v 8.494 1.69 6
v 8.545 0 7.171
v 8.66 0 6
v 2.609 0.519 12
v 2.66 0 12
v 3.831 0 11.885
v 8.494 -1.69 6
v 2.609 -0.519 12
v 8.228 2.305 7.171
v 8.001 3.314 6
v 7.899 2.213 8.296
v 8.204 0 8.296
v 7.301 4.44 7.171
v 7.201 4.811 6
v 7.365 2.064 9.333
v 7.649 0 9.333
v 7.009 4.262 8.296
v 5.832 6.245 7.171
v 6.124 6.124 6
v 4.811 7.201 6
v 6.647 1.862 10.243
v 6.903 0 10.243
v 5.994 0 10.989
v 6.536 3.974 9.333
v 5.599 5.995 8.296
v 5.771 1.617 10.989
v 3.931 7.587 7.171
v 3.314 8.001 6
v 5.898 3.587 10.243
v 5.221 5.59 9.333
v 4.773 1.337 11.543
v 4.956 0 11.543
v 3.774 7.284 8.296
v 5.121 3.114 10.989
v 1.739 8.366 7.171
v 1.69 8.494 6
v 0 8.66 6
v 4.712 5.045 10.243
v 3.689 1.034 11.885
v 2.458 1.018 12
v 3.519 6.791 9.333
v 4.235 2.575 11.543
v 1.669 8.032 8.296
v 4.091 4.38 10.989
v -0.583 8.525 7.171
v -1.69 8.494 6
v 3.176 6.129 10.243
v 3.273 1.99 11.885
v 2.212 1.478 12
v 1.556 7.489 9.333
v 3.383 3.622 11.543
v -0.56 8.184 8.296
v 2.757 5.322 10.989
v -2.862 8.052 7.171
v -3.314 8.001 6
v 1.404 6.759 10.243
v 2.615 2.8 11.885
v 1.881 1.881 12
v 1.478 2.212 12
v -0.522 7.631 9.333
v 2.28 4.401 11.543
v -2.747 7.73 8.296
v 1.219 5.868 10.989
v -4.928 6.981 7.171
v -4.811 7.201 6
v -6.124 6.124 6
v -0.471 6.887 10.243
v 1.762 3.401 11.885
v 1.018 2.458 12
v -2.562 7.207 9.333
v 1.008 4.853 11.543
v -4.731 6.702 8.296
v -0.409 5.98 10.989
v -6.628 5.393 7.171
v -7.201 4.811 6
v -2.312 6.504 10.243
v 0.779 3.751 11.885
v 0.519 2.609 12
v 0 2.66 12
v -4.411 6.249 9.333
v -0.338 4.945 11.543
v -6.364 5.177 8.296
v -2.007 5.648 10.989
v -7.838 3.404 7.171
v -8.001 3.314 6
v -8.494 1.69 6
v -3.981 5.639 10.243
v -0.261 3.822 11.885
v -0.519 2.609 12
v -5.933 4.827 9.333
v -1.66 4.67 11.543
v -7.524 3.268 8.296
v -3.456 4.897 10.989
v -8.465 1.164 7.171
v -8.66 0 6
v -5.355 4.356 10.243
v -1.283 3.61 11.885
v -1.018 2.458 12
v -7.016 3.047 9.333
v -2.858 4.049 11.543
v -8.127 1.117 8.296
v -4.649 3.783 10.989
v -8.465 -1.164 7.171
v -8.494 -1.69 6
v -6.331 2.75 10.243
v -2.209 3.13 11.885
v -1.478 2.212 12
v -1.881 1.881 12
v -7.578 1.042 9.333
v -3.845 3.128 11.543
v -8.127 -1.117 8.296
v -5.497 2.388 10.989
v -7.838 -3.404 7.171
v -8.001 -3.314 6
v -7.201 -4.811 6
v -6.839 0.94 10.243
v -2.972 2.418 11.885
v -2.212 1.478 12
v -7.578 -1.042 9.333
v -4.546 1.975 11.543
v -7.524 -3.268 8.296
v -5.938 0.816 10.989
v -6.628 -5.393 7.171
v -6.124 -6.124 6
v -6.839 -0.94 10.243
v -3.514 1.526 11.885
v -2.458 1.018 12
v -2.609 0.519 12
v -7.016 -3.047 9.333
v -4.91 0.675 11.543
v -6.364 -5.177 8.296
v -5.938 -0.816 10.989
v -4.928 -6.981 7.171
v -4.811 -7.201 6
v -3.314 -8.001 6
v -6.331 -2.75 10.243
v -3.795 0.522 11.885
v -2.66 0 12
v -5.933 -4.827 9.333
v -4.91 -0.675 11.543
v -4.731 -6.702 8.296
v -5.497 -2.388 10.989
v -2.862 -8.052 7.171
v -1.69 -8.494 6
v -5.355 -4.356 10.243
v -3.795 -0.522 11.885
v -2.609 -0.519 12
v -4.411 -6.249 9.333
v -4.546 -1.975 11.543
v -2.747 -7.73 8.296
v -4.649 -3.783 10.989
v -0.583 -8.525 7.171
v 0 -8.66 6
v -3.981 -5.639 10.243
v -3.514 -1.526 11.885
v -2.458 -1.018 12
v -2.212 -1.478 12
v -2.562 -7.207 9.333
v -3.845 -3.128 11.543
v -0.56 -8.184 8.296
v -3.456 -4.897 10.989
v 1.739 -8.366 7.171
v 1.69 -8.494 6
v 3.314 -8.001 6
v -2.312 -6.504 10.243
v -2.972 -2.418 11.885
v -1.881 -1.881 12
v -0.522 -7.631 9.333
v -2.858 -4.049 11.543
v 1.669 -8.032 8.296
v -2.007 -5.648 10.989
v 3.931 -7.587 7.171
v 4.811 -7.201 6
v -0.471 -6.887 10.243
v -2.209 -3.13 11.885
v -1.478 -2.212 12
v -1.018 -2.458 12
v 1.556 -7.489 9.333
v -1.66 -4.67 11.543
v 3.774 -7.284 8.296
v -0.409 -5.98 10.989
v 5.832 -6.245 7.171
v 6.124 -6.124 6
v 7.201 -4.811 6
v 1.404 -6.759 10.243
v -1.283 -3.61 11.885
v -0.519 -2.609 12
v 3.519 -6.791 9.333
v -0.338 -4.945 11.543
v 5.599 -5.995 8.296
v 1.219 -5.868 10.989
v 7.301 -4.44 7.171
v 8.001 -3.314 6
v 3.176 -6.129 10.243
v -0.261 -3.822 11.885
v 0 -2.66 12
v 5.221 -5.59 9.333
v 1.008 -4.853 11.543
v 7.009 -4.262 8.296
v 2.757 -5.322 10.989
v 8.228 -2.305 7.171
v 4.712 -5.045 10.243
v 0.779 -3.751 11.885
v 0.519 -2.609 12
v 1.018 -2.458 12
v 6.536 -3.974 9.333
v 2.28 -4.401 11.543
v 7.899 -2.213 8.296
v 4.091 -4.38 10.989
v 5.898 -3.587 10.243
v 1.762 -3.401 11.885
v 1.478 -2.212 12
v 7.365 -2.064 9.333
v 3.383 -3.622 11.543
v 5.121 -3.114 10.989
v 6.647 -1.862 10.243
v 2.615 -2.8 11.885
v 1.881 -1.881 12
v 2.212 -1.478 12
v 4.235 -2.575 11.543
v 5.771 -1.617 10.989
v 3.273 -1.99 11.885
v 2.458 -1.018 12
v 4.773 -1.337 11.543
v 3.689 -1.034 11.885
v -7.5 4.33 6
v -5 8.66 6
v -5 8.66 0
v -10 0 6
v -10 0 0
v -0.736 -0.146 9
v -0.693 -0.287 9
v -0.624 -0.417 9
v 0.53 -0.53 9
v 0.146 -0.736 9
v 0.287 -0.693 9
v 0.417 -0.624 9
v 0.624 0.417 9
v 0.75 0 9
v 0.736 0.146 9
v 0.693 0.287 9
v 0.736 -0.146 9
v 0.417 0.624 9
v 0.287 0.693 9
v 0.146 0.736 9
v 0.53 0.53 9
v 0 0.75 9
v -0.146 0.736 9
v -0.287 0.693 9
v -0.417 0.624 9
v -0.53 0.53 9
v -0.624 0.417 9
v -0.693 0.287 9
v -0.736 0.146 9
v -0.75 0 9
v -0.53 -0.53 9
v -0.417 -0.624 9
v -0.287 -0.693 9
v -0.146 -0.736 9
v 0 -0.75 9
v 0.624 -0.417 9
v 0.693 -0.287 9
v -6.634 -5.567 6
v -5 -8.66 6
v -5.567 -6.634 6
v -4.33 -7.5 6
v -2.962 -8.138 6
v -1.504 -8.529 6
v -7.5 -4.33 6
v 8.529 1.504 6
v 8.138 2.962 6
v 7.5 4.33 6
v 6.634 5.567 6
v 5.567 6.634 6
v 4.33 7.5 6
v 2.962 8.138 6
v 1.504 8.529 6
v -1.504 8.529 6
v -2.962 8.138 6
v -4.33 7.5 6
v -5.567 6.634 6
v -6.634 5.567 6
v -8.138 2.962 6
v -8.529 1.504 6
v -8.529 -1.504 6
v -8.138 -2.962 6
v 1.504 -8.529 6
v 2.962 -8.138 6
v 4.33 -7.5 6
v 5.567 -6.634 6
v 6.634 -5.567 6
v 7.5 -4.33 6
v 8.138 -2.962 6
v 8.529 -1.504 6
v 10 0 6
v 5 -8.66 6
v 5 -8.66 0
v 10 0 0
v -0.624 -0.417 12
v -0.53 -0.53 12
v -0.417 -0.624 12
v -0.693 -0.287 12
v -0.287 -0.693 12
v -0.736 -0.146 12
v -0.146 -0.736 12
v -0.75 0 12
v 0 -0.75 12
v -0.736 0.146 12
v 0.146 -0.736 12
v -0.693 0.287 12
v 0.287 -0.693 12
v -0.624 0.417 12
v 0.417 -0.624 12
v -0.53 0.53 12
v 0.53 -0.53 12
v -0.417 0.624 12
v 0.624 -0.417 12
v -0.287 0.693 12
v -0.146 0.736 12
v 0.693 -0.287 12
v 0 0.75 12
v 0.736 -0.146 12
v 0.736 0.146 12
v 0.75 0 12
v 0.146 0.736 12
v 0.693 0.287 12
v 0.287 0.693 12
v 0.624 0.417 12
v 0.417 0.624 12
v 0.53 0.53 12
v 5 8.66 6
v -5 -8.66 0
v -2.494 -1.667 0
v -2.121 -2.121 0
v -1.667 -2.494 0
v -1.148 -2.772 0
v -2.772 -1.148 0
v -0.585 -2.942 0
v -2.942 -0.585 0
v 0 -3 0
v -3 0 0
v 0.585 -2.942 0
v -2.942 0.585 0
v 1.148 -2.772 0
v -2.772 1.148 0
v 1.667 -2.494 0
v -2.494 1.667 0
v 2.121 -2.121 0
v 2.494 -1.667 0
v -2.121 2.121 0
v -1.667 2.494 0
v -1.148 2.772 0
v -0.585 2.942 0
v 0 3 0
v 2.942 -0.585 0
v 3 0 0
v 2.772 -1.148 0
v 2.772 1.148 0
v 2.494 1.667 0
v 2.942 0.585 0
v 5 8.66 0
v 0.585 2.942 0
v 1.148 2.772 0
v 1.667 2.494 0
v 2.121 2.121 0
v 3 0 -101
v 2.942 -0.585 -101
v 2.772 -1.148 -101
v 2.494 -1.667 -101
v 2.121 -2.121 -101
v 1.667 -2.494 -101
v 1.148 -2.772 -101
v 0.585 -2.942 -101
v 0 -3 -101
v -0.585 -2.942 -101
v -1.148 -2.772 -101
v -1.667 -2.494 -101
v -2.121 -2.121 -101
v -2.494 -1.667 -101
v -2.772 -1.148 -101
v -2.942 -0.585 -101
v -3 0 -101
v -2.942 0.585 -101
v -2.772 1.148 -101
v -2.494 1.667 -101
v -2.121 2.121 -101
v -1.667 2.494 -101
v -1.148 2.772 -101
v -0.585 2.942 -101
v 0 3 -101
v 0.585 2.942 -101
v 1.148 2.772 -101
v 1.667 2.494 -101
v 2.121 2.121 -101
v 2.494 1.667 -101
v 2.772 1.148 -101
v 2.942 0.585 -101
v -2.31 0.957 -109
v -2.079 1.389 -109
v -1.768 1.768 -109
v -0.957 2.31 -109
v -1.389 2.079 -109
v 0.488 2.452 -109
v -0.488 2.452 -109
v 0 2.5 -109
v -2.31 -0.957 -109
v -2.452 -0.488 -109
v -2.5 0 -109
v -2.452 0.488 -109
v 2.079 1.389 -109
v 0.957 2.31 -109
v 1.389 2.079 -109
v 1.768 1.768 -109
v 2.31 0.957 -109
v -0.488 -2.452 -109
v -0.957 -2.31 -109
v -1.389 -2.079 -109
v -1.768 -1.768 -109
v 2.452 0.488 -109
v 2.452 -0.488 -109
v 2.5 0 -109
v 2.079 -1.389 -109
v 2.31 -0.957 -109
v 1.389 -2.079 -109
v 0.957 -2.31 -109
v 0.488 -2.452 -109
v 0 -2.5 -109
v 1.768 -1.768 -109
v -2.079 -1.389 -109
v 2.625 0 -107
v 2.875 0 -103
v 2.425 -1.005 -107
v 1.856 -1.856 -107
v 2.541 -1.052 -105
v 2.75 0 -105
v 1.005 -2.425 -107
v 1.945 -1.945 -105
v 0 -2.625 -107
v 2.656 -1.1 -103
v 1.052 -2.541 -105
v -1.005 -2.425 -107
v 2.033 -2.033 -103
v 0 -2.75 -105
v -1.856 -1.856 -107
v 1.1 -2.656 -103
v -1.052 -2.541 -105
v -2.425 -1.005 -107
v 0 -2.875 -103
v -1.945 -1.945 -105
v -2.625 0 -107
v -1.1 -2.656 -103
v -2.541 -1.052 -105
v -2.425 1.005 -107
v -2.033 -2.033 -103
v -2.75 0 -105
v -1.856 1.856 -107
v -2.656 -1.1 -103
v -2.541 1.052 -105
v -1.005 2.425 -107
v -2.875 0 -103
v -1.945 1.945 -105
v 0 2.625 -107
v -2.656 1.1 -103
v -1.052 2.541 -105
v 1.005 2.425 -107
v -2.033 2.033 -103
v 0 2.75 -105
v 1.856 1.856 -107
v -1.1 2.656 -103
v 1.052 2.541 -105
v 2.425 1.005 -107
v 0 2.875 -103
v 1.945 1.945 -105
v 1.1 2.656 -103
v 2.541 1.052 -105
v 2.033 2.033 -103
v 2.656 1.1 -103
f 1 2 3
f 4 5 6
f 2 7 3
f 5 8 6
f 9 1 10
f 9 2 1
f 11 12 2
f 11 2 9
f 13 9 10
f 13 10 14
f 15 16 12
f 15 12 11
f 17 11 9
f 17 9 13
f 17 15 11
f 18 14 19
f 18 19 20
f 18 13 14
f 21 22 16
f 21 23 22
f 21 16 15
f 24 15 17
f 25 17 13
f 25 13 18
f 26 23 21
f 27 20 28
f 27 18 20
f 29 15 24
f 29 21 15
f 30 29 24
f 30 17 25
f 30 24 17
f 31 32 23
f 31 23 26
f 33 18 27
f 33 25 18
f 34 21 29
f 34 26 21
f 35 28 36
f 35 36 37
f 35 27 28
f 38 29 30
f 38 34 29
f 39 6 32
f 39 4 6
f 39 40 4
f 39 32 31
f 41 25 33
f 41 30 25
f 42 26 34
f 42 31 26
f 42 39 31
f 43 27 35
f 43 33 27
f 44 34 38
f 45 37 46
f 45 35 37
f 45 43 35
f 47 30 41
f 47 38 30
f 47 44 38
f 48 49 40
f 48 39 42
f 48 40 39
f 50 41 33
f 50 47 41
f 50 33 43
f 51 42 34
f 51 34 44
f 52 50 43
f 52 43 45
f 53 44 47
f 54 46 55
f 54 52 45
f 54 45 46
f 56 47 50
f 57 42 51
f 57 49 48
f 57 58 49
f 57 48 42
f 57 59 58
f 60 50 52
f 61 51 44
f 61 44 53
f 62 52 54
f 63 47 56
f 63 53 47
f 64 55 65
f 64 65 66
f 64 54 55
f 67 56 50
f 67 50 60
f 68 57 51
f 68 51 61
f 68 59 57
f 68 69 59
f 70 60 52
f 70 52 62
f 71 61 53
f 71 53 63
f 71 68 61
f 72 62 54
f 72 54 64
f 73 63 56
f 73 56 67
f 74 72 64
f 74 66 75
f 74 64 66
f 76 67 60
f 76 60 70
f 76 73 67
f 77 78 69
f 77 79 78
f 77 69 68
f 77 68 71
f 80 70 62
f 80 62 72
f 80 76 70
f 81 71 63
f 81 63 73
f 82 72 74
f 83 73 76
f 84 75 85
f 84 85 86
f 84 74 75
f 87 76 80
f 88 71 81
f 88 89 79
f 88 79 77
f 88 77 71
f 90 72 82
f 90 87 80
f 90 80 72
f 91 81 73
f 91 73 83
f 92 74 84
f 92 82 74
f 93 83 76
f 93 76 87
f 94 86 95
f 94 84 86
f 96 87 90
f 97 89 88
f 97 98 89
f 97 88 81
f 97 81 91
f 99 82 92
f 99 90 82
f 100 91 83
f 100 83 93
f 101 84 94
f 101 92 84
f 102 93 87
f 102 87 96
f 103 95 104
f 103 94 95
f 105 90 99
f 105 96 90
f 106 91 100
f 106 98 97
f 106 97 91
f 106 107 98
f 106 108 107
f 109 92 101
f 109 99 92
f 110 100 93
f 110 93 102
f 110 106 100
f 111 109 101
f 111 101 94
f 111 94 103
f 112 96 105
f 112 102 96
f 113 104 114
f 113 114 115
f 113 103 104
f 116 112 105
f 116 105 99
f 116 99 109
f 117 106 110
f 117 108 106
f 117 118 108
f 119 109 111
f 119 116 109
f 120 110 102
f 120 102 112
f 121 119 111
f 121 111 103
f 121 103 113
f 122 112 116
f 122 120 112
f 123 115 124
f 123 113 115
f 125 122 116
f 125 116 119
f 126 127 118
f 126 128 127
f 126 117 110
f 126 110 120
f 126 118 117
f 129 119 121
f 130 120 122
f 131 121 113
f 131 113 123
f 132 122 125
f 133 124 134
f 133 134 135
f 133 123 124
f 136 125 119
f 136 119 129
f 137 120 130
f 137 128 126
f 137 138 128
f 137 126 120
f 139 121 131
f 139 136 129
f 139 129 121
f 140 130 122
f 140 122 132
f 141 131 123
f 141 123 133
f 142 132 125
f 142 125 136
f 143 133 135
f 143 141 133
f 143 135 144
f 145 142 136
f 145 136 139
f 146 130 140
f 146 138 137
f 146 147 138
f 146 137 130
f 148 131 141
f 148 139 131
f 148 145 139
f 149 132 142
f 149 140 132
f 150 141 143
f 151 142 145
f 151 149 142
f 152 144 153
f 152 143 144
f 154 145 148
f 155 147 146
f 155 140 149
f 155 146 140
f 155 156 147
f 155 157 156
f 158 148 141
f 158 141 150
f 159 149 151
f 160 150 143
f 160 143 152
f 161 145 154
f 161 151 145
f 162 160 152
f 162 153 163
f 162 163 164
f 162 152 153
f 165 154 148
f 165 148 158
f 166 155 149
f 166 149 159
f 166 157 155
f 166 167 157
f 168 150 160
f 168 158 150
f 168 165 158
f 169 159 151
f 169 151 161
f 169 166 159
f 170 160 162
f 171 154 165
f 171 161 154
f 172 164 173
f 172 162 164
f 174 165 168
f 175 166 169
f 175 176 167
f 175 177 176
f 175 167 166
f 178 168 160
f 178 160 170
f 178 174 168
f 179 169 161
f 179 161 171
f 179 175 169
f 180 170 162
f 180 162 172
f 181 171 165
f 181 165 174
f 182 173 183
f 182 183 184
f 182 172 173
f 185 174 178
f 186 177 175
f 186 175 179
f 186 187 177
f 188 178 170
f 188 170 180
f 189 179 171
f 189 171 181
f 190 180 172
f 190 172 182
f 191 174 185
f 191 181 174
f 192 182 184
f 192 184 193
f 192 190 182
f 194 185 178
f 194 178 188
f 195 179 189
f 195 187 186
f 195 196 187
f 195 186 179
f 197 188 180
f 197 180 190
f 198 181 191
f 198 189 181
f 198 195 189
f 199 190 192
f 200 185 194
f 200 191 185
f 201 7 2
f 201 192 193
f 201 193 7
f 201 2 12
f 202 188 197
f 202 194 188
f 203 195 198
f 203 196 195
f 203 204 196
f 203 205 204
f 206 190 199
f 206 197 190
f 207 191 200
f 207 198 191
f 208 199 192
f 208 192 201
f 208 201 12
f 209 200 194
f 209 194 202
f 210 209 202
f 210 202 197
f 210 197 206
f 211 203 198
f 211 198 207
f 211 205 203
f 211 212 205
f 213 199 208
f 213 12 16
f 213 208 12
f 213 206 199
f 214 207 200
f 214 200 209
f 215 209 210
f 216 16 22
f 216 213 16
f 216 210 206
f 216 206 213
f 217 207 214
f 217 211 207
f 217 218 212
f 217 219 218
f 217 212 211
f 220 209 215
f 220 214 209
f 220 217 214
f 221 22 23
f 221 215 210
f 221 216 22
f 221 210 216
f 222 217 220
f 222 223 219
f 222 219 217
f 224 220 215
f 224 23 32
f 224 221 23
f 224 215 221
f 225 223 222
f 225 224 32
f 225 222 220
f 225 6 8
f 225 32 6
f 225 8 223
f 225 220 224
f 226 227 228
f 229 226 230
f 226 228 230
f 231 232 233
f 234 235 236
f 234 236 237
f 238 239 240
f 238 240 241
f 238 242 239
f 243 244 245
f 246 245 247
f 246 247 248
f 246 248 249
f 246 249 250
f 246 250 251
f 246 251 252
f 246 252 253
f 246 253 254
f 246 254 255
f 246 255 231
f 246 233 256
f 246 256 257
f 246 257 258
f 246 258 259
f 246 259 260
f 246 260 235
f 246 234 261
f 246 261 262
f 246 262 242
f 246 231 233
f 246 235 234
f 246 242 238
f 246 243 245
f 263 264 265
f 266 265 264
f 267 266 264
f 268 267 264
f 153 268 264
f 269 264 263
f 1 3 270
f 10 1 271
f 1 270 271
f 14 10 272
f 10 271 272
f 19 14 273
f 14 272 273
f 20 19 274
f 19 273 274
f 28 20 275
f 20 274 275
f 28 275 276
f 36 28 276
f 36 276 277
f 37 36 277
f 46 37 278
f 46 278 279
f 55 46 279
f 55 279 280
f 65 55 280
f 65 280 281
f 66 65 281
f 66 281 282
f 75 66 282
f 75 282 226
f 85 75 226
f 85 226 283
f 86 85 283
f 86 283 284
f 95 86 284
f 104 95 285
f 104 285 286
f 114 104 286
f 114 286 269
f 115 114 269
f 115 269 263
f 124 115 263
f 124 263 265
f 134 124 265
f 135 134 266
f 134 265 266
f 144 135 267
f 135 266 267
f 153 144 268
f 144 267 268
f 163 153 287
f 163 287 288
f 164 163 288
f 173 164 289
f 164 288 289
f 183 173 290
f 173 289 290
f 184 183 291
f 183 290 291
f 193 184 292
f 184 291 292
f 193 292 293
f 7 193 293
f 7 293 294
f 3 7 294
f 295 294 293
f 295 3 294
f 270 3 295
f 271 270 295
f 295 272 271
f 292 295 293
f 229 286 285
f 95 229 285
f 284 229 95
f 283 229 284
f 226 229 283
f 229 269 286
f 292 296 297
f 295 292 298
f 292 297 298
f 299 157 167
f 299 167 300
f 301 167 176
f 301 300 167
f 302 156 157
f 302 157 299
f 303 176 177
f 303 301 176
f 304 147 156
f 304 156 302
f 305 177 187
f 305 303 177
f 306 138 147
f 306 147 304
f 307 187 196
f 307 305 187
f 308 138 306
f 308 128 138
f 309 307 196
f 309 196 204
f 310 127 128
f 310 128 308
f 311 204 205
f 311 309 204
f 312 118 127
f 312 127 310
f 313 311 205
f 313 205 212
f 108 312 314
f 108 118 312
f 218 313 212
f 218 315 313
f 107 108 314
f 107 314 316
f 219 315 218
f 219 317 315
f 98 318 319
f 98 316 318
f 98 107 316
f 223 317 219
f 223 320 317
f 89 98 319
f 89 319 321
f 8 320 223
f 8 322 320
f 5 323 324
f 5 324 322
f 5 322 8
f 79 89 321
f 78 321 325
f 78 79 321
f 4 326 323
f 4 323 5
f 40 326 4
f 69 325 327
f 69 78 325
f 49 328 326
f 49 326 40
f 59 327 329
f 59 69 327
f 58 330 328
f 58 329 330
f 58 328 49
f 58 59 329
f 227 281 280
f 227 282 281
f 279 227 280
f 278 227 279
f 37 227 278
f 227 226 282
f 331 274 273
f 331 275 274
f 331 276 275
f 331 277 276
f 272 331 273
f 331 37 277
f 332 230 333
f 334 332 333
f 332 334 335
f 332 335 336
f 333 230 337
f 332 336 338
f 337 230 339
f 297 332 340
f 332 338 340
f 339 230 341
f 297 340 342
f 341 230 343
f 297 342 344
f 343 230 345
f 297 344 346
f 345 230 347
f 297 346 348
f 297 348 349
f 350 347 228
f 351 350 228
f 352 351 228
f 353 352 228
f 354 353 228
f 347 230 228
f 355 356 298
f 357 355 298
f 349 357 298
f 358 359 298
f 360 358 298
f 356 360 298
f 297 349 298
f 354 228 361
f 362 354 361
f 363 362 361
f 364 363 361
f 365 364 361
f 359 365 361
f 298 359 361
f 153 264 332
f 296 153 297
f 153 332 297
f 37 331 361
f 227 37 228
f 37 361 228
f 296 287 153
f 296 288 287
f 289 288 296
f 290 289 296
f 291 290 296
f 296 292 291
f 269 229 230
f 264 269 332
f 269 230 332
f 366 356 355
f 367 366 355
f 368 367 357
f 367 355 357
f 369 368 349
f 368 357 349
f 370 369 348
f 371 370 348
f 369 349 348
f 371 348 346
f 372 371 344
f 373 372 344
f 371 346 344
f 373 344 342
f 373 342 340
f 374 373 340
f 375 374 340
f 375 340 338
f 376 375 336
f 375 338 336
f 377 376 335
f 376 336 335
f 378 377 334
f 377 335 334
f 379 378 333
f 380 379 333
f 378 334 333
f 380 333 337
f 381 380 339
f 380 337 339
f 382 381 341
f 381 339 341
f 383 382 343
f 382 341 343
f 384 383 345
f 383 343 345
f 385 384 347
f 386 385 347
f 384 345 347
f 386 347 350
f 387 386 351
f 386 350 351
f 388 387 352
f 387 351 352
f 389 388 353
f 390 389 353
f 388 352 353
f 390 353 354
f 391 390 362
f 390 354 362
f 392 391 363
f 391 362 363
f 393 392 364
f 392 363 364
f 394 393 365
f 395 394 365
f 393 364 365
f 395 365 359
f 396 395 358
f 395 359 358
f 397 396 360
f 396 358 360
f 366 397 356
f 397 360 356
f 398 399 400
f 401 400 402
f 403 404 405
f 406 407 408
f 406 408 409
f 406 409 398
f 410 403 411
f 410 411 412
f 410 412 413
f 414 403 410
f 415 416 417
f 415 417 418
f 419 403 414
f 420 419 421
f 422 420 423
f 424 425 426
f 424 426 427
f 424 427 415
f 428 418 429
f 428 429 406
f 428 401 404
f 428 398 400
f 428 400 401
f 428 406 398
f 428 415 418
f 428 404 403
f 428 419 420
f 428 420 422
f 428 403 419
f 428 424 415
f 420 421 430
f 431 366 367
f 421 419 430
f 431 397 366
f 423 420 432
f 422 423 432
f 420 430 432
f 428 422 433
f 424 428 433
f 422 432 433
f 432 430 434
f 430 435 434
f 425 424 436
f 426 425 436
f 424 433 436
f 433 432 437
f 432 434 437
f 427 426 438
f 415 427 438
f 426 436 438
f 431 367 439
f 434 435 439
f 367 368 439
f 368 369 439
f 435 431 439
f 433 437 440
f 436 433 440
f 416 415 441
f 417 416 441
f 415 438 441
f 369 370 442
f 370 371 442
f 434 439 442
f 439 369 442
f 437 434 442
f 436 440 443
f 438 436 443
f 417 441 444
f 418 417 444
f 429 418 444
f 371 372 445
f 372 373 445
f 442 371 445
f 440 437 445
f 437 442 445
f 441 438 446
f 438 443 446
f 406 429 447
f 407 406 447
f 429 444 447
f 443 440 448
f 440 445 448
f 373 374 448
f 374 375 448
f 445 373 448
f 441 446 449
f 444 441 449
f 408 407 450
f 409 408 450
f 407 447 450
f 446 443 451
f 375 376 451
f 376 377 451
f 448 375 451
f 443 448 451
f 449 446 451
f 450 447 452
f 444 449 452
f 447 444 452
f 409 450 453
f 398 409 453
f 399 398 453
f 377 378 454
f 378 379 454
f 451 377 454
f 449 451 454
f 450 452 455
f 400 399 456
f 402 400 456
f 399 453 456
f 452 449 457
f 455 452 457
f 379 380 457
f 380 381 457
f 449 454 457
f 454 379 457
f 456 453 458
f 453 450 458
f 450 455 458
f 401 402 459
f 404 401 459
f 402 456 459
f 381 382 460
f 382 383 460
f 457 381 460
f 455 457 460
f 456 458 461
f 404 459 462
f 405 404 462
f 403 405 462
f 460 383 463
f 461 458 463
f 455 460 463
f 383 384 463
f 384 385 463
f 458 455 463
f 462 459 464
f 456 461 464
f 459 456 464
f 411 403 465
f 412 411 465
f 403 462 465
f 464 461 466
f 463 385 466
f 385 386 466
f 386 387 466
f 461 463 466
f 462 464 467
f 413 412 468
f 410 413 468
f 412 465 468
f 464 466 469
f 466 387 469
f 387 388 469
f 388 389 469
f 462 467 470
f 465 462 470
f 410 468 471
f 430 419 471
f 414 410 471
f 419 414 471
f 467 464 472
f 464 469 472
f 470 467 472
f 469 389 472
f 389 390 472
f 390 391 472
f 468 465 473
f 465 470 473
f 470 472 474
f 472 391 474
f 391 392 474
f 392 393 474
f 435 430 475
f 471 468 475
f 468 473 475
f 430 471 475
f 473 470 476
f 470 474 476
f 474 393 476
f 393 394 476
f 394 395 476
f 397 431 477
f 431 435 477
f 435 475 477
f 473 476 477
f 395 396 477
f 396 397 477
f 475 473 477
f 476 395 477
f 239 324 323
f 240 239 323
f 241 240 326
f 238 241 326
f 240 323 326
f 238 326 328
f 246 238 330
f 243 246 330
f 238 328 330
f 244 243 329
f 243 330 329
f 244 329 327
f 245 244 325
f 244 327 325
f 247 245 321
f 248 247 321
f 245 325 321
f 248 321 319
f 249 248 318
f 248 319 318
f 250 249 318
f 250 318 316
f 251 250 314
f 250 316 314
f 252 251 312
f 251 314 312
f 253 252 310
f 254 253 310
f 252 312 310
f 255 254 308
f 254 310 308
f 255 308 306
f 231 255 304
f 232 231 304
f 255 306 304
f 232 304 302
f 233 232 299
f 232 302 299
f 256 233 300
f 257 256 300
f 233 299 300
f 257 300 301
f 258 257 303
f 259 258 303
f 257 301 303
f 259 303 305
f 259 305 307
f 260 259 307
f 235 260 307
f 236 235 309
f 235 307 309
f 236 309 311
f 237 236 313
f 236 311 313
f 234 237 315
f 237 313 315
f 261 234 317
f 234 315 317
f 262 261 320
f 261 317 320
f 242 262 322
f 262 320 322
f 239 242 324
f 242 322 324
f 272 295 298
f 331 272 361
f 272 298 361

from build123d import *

# Parameters (mm, degrees)
F0_R     = 3
F1_DEPTH = 6
F2_R     = 8.6602540378
F3_DEPTH = 6
F4_R     = 5.99999
F5_R     = 0.75
F6_DEPTH = 3
F7_R     = 3
F8_DEPTH = 101
F10_R    = 2.5
F11_R    = 3


# Not quite as in the source:
# - a fillet or chamfer is up to 0.001 mm smaller than in the source, because OpenCascade refuses the exact size


with BuildPart() as f1:
    # F0 (on Top) → F1 (new body)
    with BuildSketch(Plane.XY):
        Polygon((5, 8.6602540378), (-5, 8.6602540378), (-10, 0), (-5, -8.6602540378), (5, -8.6602540378), (10, 0), align=None)
        Circle(F0_R, mode=Mode.SUBTRACT)
        Circle(F0_R)
    extrude(amount=F1_DEPTH)

    # F2 (on face) → F3 (join)
    with BuildSketch(Plane.XY.offset(6)):
        Circle(F2_R)
    extrude(amount=F3_DEPTH)

    # F4 (radius 6 in the source; OpenCascade refuses exactly that, so slightly less here)
    f4_edges = [f1.edges().sort_by_distance(p)[0] for p in [
        (-8.660254, 0, 12),
    ]]
    fillet(f4_edges, radius=F4_R)

    # F5 (on face) → F6 (cut)
    with BuildSketch(Plane.XY.offset(12)):
        Circle(F5_R)
    extrude(amount=-F6_DEPTH, mode=Mode.SUBTRACT)

    # F7 (on face) → F8 (join)
    with BuildSketch(Plane(origin=(0, 0, 0), x_dir=(1, 0, 0), z_dir=(0, 0, -1))):
        Circle(F7_R)
    extrude(amount=F8_DEPTH)

    # F10 (on offset) → F12 section 0
    with BuildSketch(Plane(origin=(0, 0, -109), x_dir=(1, 0, 0), z_dir=(0, 0, -1))):
        Circle(F10_R)
    # F11 (on face) → F12 section 1
    with BuildSketch(Plane(origin=(0, 0, -101), x_dir=(1, 0, 0), z_dir=(0, 0, -1))):
        Circle(F11_R)
    loft()


solid = f1.part
